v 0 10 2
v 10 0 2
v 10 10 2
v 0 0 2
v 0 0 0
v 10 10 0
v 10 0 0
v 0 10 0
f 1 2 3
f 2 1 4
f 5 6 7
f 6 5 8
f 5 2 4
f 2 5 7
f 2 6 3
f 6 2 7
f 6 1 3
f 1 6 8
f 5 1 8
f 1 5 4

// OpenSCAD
// Template fictício usado nos testes: prova que um modelo novo funciona só com .scad + template.json.
/* [Forma] */
rotulo = "Teste";
forma = "quadrado"; // [quadrado, redondo]
altura = 10;
extra = 1.5;
fixas = true;

/* [Cores] */
parte = "base"; // [base, letras_fixas, base_unica, letras_soltas]
cor = "#FF0000";
cor2 = "#00FF00";
espessura = 2;

/* [Hidden] */
$fn = 32;

module peca(){ if (forma == "quadrado") cube([altura, altura, espessura]); else cylinder(r=altura/2, h=espessura); }
if (parte == "base" || parte == "base_unica") peca();
if (parte == "letras_fixas" || parte == "letras_soltas") translate([0,0,espessura]) linear_extrude(1) text(rotulo, size=3);
